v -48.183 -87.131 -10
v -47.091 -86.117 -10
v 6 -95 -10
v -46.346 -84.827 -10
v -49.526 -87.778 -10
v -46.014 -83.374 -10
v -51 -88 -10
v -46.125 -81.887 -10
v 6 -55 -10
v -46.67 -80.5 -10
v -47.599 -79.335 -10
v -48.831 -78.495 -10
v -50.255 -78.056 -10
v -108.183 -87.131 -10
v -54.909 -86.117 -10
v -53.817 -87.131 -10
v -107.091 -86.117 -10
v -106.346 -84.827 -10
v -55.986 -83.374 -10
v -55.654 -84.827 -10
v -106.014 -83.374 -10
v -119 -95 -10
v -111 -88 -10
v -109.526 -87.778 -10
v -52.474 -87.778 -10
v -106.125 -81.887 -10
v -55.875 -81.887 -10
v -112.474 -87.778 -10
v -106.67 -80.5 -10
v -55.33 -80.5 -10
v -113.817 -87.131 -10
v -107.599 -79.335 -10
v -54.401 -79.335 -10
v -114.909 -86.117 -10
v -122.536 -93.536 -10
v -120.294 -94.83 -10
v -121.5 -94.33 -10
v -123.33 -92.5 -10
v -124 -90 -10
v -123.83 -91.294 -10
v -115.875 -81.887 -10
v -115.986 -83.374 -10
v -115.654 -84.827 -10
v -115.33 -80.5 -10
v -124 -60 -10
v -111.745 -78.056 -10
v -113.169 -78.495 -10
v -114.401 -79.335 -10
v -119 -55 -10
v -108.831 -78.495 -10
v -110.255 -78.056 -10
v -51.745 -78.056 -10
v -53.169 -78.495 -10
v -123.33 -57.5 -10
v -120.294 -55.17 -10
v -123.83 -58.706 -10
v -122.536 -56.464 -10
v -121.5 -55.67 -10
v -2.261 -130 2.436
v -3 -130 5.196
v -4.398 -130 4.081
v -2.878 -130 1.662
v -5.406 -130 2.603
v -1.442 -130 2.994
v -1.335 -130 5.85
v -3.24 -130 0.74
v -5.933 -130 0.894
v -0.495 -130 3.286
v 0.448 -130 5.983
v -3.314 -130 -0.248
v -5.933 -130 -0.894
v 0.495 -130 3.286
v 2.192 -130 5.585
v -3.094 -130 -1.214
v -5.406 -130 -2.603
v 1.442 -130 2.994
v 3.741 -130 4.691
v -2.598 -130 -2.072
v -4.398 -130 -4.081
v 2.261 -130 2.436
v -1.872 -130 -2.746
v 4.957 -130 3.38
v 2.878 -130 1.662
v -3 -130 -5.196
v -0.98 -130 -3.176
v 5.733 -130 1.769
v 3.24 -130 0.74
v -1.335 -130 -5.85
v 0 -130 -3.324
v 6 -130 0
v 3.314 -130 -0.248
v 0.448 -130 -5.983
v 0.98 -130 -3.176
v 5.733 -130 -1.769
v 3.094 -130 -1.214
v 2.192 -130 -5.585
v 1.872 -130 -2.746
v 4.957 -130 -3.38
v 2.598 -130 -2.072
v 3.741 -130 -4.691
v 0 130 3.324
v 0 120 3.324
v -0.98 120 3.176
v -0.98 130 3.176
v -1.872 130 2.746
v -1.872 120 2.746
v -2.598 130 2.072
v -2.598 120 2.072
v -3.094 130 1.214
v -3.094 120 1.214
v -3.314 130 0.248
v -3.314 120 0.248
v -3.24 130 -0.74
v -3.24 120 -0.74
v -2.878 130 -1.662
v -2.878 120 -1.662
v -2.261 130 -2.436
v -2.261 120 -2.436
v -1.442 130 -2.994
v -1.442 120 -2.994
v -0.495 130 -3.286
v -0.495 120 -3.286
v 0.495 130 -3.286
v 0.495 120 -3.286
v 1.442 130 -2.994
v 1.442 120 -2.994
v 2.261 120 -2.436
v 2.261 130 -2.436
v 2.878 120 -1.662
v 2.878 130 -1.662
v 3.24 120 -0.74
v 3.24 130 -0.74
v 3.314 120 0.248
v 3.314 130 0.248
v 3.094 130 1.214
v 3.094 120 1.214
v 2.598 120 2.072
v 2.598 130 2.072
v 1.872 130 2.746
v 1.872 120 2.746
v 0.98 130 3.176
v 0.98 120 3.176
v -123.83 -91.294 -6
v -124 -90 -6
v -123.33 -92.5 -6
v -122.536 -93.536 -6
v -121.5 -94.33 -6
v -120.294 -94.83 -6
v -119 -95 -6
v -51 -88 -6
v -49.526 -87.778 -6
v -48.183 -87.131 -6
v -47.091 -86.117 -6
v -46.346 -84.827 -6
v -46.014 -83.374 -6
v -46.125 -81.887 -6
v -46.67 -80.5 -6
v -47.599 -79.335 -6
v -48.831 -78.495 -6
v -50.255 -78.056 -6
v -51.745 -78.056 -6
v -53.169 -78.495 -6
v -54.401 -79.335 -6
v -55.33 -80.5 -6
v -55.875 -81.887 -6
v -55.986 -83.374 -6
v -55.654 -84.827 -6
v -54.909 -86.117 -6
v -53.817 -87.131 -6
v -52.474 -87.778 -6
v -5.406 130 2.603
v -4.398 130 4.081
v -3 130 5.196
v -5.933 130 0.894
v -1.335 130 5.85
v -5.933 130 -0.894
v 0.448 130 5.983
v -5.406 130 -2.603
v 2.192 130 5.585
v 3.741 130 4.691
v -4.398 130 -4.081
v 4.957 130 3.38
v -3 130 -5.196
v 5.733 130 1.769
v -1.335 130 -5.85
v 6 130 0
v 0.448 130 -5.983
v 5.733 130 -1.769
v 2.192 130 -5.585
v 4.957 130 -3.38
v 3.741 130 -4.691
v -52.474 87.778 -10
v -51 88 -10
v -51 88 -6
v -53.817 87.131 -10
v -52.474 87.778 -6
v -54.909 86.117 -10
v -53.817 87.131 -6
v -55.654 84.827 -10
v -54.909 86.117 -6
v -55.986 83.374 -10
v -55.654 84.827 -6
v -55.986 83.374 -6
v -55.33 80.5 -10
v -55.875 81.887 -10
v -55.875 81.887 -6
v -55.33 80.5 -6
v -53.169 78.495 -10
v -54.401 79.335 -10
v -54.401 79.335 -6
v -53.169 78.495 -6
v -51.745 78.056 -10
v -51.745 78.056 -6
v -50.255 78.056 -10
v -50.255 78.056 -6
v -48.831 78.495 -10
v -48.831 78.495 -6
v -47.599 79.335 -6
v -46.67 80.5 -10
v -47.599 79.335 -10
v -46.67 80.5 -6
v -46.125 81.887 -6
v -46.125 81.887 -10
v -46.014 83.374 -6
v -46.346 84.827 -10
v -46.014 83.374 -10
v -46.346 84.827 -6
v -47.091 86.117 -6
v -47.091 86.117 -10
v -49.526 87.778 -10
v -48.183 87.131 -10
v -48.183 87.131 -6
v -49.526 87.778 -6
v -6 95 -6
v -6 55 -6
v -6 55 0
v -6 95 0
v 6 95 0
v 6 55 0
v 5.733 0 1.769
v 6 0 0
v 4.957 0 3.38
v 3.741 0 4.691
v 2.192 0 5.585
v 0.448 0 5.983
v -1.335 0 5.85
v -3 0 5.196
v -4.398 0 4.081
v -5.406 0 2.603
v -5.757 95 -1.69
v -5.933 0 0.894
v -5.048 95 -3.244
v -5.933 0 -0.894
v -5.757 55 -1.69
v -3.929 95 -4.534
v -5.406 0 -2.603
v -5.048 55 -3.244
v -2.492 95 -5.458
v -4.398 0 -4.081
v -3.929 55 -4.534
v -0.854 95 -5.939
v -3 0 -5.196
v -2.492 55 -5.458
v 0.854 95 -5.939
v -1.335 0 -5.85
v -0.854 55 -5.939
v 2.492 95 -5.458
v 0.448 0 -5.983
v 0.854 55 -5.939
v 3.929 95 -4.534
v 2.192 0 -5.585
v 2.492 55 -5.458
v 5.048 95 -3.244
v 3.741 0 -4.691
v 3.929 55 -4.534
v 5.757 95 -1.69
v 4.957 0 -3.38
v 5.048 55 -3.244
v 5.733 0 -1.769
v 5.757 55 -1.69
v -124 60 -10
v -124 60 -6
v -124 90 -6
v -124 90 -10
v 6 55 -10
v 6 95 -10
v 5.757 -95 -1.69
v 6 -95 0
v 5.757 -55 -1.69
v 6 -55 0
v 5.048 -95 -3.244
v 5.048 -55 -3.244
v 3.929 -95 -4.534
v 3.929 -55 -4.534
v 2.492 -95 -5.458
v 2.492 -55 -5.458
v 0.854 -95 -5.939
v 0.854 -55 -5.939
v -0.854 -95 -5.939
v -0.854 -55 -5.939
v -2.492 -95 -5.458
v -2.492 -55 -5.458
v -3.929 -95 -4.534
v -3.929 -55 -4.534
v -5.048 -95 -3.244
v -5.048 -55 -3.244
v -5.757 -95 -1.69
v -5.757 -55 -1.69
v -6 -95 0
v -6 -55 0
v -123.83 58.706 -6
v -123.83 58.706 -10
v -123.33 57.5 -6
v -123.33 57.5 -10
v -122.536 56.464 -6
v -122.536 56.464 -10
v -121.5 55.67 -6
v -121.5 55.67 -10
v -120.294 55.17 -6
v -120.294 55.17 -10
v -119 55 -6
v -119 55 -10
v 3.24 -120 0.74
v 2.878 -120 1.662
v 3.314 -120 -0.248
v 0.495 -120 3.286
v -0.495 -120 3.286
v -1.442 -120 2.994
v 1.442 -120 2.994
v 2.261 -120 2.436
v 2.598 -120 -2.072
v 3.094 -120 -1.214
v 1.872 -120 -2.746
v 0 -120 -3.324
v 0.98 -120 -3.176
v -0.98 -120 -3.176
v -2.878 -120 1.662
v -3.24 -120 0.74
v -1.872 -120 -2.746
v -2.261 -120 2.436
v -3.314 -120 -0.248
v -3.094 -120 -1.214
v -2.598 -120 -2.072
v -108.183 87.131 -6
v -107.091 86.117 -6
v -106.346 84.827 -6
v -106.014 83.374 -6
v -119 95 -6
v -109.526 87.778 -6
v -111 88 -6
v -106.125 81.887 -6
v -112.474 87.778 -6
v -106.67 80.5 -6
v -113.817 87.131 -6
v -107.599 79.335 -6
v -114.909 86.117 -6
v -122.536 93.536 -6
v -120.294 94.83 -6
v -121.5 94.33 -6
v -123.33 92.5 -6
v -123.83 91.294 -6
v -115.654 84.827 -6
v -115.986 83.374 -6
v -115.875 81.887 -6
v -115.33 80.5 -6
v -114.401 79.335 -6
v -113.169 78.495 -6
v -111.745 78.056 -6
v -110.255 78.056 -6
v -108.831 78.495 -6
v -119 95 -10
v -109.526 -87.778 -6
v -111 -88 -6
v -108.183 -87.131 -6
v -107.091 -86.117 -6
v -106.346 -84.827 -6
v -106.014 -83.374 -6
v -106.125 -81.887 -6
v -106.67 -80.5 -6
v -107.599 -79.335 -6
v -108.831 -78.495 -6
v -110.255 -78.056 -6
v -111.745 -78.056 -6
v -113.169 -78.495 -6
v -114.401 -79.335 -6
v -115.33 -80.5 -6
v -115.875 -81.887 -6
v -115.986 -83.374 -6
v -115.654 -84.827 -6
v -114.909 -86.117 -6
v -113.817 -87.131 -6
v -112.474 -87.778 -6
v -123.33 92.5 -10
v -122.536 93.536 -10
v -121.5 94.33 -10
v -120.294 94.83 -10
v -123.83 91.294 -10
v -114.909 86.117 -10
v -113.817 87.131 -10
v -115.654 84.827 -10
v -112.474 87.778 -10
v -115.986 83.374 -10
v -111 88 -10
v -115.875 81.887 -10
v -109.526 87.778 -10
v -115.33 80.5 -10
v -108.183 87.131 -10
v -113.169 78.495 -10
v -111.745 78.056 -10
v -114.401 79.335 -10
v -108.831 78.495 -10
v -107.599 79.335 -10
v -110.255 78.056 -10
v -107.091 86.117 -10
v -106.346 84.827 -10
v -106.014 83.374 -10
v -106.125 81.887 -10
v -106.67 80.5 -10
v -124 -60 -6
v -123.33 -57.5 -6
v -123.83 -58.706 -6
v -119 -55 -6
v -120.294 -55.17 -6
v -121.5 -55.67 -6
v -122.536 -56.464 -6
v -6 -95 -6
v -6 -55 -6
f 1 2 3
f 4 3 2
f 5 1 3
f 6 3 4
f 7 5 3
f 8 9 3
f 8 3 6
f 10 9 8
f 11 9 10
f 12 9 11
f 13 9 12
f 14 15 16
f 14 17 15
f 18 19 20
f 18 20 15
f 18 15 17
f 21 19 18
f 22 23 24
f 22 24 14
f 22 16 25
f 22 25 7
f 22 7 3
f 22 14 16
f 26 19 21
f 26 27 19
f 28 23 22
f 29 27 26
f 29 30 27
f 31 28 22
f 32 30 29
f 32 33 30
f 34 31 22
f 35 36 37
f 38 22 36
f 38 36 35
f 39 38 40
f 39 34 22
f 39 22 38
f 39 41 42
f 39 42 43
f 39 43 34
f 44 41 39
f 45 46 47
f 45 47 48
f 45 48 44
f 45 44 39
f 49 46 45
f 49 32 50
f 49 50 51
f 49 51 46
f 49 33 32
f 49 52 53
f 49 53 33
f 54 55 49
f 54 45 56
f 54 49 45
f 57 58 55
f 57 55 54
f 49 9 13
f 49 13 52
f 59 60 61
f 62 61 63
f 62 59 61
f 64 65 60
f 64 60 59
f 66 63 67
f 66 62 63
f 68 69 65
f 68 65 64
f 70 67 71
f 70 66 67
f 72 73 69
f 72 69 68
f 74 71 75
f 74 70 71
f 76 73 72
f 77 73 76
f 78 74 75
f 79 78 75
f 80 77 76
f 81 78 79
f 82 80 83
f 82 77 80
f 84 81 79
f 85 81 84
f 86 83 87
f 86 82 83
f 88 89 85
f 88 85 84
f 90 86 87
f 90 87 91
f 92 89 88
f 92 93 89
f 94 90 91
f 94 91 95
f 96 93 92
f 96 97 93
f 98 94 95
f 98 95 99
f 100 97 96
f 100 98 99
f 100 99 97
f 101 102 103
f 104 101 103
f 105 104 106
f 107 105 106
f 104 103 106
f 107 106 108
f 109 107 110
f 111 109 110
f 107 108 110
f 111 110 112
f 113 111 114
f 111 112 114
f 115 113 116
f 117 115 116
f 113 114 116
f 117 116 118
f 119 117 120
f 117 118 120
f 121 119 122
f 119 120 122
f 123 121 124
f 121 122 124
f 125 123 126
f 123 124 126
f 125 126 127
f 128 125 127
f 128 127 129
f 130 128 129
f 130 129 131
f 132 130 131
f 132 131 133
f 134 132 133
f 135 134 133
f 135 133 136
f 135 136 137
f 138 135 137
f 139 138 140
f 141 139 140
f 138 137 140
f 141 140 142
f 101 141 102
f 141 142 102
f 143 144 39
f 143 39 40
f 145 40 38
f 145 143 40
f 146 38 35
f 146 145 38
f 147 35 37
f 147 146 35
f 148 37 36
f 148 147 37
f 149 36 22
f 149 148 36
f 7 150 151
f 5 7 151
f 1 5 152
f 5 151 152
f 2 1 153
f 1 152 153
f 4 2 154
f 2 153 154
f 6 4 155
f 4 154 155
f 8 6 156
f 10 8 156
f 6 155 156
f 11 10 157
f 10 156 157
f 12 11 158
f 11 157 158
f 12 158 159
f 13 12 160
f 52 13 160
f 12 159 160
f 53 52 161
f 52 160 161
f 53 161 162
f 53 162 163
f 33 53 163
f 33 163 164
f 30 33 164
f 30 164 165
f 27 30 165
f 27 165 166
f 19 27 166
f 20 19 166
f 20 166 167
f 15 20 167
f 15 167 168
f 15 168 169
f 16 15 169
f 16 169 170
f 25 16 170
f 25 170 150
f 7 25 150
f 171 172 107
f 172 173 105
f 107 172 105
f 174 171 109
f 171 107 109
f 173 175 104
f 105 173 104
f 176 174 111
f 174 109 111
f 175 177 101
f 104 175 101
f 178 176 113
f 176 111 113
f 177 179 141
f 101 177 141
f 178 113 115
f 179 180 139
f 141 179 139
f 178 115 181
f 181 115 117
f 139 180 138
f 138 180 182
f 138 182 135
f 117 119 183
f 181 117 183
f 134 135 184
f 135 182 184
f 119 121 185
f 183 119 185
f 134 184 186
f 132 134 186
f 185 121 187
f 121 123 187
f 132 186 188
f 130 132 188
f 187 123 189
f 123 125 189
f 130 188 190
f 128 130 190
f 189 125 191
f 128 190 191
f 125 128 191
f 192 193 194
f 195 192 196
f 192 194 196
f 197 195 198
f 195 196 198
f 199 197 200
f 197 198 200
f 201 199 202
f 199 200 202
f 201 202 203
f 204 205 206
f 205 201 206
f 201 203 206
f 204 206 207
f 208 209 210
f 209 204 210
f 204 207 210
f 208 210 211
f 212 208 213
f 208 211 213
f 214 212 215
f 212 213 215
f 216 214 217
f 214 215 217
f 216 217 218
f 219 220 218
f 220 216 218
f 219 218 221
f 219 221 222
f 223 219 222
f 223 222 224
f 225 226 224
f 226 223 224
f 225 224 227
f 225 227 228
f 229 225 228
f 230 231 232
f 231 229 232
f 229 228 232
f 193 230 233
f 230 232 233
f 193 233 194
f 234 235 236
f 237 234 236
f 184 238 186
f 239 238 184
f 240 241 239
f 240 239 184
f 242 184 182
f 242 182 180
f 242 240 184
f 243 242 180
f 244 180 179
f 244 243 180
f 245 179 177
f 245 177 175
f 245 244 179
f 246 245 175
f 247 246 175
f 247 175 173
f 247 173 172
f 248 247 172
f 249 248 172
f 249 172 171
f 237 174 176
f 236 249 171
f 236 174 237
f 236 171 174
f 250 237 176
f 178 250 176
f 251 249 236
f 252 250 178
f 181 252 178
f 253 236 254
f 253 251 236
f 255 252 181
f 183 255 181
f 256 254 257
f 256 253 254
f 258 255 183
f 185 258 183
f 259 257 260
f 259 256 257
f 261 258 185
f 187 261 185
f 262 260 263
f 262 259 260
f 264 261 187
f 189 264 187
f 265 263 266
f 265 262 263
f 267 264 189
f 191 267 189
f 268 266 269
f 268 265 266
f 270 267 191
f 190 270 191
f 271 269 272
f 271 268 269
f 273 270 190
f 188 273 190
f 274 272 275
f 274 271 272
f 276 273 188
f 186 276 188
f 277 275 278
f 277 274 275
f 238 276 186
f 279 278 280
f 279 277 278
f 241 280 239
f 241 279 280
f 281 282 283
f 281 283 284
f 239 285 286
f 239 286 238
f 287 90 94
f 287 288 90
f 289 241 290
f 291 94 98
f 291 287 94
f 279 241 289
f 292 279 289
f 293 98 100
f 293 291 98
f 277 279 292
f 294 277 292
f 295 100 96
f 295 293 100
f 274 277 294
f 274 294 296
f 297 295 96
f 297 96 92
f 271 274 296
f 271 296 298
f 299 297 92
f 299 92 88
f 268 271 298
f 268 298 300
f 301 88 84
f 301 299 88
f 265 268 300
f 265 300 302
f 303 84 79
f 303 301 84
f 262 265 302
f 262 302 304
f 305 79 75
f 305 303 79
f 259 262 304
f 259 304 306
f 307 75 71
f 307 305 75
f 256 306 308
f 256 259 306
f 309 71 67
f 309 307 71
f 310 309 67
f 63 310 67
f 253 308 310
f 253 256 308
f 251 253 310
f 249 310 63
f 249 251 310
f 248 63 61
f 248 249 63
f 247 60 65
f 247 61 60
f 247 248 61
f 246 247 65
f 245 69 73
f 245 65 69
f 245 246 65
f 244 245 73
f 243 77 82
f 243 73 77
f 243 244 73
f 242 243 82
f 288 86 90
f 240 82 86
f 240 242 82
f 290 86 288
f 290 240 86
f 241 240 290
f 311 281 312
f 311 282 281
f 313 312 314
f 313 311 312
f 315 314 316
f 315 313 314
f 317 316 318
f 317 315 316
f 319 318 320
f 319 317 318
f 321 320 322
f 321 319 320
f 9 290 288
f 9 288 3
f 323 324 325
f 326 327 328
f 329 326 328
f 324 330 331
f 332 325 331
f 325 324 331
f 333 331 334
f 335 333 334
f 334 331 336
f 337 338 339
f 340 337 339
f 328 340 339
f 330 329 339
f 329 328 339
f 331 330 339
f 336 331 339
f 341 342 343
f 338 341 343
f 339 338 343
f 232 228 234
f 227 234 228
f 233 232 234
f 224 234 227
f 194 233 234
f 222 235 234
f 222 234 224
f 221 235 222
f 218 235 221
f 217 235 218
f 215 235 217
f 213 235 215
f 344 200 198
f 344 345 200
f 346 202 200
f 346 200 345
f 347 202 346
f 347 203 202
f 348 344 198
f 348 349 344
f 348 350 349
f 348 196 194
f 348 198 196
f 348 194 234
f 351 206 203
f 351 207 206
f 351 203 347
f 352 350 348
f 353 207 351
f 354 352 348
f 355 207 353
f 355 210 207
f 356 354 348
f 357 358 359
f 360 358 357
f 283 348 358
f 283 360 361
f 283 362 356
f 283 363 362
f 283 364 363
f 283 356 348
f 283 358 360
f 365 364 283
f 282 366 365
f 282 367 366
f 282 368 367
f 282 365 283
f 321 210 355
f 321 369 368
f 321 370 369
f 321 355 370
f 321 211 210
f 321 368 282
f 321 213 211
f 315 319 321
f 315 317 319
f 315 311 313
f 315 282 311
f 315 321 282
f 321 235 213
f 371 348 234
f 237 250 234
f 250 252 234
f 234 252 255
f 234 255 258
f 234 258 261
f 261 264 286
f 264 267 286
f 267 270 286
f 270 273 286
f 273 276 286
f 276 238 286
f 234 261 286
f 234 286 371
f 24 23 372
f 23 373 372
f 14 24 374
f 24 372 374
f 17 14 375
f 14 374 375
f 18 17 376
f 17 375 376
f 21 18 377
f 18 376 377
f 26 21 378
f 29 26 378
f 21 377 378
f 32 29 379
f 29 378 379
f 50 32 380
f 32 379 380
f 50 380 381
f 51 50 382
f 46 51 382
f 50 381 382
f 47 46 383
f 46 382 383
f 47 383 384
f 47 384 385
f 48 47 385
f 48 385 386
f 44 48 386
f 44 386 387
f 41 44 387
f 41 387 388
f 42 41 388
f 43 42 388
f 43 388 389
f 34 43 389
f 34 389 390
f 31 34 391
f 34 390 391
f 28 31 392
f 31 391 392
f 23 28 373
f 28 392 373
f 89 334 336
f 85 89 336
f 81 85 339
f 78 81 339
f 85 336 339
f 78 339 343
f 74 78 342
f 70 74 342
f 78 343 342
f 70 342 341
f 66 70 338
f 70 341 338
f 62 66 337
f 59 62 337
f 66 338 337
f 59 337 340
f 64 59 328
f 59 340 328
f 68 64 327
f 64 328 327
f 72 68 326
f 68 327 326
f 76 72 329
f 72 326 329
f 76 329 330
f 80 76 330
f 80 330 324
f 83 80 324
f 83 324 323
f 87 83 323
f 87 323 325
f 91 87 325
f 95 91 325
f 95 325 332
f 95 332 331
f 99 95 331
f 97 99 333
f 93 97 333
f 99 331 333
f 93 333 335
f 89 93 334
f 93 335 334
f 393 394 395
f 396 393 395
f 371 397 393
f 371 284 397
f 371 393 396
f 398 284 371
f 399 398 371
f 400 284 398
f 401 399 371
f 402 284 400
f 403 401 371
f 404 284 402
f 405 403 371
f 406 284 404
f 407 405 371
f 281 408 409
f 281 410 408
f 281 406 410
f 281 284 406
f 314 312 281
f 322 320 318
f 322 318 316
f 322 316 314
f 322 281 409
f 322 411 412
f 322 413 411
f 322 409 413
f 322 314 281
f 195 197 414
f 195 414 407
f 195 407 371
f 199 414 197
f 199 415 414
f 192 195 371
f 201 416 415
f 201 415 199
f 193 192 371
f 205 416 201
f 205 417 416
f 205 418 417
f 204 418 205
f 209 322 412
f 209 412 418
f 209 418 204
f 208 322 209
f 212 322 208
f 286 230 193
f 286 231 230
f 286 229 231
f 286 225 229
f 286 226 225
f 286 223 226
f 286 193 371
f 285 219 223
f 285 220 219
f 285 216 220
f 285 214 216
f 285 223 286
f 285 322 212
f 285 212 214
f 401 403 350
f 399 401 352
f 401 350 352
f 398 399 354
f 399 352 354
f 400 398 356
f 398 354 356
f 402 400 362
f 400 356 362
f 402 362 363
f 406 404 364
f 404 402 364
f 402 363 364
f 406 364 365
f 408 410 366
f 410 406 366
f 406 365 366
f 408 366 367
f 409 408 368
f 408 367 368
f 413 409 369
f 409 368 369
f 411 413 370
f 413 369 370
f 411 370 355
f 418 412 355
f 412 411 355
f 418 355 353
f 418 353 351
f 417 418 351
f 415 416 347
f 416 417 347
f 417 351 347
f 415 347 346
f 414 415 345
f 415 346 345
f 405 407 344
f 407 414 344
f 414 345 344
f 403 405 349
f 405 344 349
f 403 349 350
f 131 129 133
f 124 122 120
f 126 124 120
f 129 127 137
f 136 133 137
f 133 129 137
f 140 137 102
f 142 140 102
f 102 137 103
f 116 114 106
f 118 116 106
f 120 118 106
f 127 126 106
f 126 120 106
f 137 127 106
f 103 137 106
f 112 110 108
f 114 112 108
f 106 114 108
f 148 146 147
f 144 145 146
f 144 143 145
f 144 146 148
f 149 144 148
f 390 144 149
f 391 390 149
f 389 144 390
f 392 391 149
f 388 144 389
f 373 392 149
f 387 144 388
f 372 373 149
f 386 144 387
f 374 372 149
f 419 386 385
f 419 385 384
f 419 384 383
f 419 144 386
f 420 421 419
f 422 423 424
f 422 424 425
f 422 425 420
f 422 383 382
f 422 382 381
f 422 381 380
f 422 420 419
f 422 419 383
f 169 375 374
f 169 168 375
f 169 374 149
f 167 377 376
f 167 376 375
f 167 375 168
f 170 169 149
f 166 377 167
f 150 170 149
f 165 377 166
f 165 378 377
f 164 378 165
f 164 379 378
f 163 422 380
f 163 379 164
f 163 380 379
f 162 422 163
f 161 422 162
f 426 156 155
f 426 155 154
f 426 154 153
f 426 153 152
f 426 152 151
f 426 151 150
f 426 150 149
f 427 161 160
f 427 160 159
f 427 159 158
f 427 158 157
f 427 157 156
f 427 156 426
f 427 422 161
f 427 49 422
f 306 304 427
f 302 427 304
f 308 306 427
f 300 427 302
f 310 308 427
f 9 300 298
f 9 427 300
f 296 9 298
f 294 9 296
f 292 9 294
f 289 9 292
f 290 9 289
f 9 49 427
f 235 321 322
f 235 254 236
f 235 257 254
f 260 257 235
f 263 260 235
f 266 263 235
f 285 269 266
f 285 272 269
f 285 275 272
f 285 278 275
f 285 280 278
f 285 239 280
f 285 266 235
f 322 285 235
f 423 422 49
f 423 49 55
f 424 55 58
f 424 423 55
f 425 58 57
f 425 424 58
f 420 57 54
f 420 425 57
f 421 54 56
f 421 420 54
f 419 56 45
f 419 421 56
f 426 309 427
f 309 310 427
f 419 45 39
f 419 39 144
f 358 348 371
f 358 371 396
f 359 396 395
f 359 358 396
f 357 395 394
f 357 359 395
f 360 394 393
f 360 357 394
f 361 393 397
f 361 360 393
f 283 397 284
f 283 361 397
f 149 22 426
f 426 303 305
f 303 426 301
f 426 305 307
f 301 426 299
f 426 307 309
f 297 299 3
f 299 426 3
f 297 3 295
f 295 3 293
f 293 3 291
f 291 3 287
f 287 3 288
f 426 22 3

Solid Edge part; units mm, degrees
sketch "Sketch1" plane through (0, 0, 0) normal (0, -1, 0) x (1, 0, 0)
  circle A0 centre (0, 0) radius 6
extrude "Protrusion1" add sketch "Sketch1" along normal mid plane 260
hole "Hole_1" at (0, -130, 0) direction (0, 1, 0) diameter 6.647 depth 10
hole "Hole_2" at (0, 130, 0) direction (0, -1, 0) diameter 6.647 depth 10
sketch "Sketch2" plane through (0, -75, 0) normal (0, -1, 0) x (1, 0, 0)
  line L0 (6, -6) -> (6, -10)
  line L1 (6, -10) -> (-124, -10)
  line L2 (-124, -10) -> (-124, -6)
  line L3 (-124, -6) -> (-6, -6)
  line L4 (-6, 0) -> (-6, -6)
  line L5 (6, 0) -> (6, -6)
  arc A0 (-6, 0) -> (6, 0) centre (0, 0) ccw
extrude "ExtrudedProtrusion_2" add sketch "Sketch2" along normal mid plane 40
fillet "Round_1" radius 5 2 edges at (-124, -95, -8) (-124, -55, -8)
hole "Hole_7" at (-111, -83, -6) direction (0, 0, -1) diameter 10 end up to next
hole "Hole1" at (-51, -83, -6) direction (0, 0, -1) diameter 10 end up to next
mirror "Mirror1" about plane through (0, 0, 0) normal (0, -1, 0) of "ExtrudedProtrusion_2", "Round_1", "Hole_7", "Hole1"
